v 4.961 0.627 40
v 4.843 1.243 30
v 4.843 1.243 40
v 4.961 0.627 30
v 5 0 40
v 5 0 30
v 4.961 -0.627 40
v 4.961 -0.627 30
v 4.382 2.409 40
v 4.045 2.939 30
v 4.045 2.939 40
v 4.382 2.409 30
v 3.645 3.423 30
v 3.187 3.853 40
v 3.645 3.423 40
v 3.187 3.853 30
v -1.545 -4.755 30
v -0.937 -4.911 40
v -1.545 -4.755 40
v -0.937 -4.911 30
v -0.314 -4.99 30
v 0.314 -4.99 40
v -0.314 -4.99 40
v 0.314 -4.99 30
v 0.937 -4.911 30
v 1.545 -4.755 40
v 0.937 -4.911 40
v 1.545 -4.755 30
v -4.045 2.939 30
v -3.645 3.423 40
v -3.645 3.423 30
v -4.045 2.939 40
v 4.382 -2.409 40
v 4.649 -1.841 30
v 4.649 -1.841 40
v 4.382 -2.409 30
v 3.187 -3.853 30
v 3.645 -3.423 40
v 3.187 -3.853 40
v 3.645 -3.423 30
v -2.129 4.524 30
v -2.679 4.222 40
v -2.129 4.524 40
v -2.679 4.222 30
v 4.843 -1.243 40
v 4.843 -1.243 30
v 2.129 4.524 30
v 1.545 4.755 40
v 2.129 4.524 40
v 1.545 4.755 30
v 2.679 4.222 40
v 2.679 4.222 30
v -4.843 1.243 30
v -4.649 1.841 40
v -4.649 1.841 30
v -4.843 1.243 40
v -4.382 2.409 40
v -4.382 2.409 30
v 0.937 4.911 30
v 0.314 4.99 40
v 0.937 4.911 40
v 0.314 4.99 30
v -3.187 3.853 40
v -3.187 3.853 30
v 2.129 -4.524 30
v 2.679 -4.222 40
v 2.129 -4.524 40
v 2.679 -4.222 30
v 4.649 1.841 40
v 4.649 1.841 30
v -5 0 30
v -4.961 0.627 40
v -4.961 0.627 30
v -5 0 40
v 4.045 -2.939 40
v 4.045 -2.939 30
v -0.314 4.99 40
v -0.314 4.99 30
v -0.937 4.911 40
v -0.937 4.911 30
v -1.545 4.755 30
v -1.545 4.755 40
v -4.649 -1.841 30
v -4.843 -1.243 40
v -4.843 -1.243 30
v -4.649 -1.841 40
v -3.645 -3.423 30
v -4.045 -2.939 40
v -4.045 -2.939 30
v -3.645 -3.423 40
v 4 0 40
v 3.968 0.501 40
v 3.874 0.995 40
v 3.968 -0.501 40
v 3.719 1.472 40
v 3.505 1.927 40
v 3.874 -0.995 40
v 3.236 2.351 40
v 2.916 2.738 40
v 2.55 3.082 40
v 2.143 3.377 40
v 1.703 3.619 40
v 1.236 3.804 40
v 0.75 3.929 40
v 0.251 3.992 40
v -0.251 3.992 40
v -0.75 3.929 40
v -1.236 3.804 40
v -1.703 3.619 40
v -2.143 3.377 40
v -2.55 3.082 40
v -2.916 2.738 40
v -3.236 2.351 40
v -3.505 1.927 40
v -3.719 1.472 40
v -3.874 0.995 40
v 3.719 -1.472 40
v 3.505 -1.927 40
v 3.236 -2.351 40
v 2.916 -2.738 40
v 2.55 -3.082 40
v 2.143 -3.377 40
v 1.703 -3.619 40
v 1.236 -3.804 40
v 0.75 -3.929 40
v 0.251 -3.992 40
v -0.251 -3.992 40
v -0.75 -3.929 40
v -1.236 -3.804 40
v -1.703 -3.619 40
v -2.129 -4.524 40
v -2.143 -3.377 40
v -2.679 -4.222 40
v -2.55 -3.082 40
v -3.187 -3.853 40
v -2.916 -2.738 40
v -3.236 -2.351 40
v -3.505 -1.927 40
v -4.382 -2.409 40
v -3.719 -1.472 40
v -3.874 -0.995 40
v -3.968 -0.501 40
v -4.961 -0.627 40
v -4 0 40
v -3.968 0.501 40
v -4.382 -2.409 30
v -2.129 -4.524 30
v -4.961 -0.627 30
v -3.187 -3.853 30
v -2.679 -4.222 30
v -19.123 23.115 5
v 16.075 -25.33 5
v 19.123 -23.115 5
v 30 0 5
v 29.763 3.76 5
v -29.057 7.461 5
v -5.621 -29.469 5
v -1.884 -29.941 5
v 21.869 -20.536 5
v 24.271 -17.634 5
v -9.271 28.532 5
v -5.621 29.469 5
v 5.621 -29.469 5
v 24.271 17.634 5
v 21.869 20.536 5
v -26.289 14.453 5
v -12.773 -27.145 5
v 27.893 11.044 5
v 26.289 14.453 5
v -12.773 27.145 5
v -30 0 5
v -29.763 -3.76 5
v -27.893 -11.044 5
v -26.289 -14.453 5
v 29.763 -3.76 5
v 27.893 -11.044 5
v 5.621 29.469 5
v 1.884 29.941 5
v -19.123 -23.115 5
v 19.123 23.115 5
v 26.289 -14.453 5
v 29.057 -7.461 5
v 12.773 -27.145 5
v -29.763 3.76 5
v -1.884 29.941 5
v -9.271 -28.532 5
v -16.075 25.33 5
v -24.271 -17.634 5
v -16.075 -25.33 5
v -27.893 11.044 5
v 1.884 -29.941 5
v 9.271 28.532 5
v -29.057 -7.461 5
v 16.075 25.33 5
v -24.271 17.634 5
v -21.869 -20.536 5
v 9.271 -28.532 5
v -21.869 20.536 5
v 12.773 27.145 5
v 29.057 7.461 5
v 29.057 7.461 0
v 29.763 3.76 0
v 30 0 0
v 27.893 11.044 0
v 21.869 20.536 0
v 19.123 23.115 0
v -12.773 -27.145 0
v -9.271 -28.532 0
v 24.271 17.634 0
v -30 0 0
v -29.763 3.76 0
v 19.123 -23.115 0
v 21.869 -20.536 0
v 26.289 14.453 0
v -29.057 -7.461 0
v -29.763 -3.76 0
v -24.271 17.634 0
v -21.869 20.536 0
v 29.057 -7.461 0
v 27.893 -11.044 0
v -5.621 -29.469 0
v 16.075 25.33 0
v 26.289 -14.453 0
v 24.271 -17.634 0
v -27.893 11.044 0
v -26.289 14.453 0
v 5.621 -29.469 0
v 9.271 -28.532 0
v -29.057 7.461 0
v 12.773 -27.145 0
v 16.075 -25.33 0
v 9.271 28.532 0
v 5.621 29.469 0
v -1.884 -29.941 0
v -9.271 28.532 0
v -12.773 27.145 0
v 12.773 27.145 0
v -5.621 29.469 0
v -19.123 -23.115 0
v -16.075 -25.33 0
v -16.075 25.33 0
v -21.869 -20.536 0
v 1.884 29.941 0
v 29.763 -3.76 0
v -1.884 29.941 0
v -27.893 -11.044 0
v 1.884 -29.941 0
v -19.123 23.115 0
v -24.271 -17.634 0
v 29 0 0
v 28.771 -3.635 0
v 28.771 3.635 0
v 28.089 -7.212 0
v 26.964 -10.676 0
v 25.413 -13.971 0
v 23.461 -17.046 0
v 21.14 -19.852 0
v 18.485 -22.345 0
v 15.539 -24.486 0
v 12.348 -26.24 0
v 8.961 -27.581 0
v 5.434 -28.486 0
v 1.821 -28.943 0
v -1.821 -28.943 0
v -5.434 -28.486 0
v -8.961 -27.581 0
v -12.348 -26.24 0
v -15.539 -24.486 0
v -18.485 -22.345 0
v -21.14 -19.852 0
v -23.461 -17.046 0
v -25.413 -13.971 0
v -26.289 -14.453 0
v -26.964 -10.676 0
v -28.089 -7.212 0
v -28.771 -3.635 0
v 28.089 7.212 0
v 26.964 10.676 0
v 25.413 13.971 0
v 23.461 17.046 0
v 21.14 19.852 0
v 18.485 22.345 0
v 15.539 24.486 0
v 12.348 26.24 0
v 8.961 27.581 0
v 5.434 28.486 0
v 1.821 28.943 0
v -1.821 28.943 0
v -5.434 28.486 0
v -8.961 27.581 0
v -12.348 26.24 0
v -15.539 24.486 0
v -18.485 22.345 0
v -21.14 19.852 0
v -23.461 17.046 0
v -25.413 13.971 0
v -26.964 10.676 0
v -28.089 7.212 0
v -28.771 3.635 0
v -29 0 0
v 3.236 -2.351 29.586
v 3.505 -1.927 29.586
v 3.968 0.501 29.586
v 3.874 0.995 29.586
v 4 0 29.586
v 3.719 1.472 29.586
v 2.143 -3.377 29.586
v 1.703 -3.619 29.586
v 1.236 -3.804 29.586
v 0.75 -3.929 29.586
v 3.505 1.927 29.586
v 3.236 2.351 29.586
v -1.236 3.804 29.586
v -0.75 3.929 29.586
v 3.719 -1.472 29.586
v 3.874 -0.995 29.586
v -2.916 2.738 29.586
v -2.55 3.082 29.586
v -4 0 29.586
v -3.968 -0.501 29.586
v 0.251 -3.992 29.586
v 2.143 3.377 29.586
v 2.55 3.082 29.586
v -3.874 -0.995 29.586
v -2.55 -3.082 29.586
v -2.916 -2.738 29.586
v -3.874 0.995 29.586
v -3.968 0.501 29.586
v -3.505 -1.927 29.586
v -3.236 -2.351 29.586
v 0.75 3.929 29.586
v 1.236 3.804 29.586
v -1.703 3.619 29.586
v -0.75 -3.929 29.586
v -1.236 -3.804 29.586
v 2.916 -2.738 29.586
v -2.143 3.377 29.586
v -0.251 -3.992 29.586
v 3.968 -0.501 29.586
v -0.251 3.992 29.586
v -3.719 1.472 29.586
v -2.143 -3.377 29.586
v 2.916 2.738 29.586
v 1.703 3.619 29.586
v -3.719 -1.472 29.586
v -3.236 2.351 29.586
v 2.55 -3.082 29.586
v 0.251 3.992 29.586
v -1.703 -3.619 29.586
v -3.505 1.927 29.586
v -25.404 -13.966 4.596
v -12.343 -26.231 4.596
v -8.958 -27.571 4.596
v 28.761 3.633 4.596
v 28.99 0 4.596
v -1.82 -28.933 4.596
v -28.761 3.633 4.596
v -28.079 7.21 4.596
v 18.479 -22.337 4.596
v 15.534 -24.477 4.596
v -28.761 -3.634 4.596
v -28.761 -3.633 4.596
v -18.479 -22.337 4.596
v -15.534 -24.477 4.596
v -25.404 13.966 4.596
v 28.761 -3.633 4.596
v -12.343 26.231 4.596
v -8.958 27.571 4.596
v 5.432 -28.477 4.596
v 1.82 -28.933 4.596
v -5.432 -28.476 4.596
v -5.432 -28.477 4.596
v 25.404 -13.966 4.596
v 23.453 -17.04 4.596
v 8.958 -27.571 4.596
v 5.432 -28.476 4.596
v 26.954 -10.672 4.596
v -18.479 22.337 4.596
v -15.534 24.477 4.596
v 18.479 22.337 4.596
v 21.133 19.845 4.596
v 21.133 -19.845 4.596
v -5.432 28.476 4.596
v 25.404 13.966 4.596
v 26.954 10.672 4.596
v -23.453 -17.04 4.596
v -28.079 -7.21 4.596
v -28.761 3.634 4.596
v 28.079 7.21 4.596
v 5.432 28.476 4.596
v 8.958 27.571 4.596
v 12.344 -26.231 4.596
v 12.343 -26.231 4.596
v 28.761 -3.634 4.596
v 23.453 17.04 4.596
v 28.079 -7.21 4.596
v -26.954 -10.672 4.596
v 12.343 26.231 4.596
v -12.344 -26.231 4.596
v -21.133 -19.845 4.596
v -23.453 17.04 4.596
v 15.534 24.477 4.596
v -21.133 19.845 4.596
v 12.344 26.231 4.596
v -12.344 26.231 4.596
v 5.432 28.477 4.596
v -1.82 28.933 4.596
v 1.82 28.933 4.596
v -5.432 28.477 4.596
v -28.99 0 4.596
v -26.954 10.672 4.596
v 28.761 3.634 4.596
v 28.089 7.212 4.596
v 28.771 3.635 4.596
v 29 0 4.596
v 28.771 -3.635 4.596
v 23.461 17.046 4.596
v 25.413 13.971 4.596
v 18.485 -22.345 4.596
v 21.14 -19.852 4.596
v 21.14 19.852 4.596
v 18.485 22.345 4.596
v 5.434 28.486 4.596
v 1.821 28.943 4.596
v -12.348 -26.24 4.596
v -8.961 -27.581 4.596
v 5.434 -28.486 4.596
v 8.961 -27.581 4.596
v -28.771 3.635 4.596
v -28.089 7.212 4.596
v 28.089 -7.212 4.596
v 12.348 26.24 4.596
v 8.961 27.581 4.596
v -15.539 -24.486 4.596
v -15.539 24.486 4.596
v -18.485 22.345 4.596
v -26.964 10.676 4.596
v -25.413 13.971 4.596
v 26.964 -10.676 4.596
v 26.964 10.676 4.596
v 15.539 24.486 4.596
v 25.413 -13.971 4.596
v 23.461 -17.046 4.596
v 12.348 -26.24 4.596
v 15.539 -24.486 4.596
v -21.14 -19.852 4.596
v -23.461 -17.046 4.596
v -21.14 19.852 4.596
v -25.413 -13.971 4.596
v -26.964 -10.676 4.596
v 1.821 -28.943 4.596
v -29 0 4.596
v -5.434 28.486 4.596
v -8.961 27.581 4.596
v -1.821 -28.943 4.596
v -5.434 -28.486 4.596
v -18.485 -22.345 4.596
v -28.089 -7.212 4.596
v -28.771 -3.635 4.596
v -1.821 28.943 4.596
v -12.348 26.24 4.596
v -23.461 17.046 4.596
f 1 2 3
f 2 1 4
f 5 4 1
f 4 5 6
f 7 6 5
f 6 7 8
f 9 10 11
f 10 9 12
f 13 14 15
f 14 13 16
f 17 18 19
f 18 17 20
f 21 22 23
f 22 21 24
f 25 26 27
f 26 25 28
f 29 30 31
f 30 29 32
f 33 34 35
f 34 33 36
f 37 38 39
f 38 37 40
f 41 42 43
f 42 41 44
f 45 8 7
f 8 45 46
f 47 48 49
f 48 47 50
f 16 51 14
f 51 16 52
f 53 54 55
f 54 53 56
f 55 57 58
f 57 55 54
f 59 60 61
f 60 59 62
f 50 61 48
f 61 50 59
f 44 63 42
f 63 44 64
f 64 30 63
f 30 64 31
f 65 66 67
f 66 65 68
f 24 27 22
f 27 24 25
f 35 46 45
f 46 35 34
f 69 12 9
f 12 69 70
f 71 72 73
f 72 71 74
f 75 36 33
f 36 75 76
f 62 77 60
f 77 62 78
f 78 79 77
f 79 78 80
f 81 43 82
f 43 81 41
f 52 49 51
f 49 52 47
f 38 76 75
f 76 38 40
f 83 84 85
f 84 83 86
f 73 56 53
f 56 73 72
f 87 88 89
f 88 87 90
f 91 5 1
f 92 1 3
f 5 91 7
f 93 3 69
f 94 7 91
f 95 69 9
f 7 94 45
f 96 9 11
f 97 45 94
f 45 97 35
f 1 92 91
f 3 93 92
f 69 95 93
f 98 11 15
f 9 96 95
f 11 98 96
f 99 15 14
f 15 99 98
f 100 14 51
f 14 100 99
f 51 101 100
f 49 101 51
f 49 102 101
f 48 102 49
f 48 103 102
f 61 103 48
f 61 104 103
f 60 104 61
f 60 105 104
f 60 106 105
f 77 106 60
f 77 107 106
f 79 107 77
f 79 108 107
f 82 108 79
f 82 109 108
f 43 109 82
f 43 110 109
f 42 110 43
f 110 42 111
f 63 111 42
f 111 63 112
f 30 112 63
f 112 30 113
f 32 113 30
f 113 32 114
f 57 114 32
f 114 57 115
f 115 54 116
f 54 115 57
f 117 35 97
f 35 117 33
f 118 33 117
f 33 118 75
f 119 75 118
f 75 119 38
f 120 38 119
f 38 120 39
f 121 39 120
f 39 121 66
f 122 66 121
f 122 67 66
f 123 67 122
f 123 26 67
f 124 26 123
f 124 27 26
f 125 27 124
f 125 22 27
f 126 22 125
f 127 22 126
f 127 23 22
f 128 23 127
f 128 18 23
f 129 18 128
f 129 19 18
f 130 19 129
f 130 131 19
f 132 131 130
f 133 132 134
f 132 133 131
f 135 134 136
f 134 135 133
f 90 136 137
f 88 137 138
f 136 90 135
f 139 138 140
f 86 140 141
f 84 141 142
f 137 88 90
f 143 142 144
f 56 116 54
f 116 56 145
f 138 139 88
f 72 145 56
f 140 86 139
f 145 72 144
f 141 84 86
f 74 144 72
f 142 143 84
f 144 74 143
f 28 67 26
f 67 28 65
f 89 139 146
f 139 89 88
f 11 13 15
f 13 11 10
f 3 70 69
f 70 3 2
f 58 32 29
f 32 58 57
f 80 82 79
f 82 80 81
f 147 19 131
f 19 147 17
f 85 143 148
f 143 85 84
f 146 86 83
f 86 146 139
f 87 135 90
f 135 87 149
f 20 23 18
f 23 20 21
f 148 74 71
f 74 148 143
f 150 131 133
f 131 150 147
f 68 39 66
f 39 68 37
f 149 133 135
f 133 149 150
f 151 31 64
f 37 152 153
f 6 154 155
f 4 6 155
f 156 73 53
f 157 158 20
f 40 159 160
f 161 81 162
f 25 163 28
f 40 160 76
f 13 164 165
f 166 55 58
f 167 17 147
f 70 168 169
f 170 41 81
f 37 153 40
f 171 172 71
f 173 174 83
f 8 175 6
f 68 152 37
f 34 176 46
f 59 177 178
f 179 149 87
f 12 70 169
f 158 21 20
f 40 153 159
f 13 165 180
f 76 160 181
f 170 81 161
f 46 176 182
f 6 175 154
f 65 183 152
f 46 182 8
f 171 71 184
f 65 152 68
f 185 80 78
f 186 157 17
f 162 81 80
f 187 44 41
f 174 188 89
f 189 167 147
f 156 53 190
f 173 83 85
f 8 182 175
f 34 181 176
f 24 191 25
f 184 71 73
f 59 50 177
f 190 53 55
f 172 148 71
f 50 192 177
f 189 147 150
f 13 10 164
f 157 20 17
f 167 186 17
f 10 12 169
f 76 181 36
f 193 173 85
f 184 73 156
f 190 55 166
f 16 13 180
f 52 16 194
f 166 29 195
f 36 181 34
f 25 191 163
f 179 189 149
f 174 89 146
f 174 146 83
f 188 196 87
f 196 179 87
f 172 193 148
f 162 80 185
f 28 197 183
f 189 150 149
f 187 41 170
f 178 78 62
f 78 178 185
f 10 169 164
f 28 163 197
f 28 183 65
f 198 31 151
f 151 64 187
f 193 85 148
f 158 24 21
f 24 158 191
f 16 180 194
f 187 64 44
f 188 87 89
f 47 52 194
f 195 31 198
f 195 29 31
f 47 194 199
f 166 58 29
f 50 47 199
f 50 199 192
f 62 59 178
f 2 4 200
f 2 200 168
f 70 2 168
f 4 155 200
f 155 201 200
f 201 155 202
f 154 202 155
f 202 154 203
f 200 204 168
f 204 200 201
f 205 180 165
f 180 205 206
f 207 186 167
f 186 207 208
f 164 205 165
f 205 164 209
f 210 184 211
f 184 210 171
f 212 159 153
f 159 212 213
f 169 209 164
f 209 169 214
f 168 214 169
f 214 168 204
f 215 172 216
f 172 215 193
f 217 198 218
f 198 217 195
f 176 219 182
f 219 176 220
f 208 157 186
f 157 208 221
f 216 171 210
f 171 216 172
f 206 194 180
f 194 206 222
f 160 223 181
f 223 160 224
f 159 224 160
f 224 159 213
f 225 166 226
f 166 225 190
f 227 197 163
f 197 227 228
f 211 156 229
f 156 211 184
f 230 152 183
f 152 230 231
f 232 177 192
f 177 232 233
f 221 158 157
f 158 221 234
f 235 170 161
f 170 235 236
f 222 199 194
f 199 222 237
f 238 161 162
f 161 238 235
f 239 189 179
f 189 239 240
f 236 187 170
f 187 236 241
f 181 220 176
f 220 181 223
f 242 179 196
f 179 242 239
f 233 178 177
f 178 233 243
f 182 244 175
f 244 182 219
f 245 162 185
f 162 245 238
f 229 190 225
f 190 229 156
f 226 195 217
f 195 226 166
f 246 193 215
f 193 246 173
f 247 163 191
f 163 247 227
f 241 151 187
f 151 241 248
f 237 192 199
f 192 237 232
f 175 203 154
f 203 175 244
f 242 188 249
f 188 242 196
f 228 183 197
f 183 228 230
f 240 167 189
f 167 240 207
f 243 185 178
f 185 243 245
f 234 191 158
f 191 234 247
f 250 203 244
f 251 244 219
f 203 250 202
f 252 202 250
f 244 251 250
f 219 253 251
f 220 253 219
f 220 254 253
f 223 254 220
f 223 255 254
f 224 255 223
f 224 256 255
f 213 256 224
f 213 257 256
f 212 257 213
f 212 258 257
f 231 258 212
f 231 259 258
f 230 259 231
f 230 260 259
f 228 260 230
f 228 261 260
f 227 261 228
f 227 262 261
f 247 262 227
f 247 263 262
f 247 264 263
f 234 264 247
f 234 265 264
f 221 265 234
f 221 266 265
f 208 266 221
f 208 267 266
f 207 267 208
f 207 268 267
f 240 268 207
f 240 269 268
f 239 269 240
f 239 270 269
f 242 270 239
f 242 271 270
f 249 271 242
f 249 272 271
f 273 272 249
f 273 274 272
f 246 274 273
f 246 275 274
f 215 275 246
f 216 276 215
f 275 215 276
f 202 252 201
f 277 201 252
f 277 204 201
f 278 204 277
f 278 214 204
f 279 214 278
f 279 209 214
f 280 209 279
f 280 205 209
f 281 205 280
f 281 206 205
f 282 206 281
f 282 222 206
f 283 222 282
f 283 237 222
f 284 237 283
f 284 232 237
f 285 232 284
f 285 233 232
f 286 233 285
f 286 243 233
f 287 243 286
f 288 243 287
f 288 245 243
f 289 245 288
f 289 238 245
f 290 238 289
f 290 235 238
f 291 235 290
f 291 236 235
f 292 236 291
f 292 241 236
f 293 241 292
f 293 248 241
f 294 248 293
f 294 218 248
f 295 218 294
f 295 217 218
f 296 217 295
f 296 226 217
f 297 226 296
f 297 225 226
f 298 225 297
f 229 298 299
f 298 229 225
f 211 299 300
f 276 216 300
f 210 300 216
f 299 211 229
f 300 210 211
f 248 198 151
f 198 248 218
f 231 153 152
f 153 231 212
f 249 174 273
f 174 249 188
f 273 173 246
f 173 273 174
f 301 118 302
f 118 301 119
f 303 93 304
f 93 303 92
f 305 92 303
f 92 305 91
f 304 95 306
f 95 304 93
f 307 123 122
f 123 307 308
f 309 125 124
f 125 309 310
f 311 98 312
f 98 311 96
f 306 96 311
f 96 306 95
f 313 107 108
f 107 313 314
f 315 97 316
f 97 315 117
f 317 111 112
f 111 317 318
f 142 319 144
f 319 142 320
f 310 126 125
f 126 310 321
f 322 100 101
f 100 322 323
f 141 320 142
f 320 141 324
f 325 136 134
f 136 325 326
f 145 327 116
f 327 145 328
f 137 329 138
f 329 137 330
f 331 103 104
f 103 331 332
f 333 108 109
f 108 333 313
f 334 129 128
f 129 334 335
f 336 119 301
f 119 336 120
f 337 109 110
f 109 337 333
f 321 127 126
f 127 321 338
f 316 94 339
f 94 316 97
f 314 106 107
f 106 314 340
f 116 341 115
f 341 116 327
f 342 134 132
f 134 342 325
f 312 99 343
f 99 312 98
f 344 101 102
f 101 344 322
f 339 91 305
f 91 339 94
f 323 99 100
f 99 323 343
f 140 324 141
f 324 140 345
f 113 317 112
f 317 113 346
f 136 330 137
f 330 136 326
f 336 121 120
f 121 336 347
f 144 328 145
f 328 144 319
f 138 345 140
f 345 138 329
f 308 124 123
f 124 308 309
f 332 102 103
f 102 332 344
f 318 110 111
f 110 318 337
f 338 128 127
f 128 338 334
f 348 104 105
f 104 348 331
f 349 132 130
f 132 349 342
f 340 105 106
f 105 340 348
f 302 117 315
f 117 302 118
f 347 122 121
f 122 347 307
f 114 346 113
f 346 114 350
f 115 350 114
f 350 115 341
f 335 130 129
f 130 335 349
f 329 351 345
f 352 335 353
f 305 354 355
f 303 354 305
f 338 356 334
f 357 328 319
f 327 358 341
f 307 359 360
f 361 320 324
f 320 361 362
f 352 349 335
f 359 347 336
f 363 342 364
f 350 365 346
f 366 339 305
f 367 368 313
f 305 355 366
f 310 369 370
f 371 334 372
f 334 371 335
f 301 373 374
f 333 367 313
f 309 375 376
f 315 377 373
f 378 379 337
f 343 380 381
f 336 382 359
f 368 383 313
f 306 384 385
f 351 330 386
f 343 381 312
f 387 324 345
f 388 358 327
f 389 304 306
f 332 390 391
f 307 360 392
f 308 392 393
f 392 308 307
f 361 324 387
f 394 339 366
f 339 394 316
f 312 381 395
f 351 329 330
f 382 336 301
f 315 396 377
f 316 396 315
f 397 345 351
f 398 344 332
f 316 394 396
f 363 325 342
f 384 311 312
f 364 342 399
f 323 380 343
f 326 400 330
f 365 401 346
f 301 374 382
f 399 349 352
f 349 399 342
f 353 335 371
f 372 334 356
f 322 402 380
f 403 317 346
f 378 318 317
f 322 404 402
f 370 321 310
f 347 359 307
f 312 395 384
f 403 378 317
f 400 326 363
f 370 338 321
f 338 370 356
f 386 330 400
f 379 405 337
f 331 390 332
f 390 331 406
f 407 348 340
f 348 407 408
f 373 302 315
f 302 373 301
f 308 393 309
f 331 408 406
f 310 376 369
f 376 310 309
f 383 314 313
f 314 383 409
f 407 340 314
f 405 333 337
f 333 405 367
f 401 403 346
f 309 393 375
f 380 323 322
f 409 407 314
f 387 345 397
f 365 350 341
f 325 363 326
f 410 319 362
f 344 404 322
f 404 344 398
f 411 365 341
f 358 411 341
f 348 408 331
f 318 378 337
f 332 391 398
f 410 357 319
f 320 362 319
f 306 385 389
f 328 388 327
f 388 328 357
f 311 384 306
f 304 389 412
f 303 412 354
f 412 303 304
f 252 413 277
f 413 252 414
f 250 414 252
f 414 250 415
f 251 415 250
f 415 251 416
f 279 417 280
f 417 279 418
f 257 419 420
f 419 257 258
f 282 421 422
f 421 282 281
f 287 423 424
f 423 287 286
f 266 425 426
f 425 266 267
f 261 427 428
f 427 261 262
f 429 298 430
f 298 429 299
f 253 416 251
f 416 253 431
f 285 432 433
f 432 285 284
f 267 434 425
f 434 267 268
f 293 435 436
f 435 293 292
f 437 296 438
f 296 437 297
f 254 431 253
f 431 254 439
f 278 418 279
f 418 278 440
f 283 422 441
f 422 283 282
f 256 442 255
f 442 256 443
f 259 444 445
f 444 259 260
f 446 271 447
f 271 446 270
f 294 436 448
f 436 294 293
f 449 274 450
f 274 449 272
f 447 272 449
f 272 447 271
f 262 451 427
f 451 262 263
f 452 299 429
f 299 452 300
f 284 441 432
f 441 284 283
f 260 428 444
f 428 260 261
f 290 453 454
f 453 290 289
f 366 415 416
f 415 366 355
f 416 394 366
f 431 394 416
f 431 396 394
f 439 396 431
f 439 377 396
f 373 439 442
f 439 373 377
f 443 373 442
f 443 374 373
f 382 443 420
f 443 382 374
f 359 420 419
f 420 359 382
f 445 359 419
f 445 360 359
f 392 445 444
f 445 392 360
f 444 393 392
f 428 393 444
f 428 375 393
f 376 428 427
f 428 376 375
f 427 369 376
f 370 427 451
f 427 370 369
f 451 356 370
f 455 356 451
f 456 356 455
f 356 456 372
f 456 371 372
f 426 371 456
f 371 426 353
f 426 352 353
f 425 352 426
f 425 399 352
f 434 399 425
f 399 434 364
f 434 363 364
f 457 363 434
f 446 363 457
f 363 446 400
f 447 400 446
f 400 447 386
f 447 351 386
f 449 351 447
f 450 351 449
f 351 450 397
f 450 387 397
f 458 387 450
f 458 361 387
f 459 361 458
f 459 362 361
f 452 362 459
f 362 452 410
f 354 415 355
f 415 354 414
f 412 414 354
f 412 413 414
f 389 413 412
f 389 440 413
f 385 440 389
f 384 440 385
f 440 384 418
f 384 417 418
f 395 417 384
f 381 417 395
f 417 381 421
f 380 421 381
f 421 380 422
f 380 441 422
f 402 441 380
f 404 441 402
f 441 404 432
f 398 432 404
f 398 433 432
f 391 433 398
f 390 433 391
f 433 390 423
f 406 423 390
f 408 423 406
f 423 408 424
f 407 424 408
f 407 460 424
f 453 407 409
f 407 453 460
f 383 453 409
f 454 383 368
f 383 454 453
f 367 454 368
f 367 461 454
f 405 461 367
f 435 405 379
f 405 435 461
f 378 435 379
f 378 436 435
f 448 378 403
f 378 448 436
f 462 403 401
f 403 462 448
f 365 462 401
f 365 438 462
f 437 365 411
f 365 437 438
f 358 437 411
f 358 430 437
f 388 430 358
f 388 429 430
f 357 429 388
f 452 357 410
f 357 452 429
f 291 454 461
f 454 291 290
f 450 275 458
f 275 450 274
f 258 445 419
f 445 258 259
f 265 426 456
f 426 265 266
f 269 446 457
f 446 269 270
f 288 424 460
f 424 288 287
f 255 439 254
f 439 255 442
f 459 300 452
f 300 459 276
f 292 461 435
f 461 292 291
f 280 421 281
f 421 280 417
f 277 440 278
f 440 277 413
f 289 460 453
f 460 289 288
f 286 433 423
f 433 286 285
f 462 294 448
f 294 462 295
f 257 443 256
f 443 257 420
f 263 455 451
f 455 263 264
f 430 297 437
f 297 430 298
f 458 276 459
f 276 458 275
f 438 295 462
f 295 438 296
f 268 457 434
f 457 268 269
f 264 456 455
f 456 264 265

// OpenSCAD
// preview[view:south, tilt:top diagonal]

//*********Declaration of customization variables************

//What outer diameter should the large opening have?
Large_End_Diameter = 60;

//What outer diameter should the small opening have?
Small_End_Diameter = 10;

//How thick should the walls be?
Wall_Thickness = 1; // [1:5]

//What's the overall height of the funnel?
Funnel_Height = 40;

//How tall should the band on the top be before the funnel begins?
Top_Band = 5;

//How long should the spout on the bottom be after the funnel ends?
Bottom_Spout_Length = 10;

//**********Assignment of customization vars to original scad vars***

spout_or = Small_End_Diameter/2;  //outer radius of bottom opening / spout
wall = Wall_Thickness; //wall thickness
flare_percentage = Large_End_Diameter / Small_End_Diameter * 100; // ratio of funnel opening (top) to spout (bottom), expressed as percentage
height = Funnel_Height; //total height
bottom_band=Bottom_Spout_Length;

res = 100/2; //resolution for cylinders
plane = 0.01/1;

//**********calculated variables*******************

spout_ir = spout_or - wall;
top_or = spout_or*flare_percentage/100;
top_ir = top_or - wall;

h1 = bottom_band;
h2 = height - Top_Band;
funnel_rise = height - bottom_band - Top_Band;
hi_adjust_ang = atan((top_or-spout_or)/funnel_rise)/2;
hi_adjust = wall*tan(hi_adjust_ang);

//**********begin build****************************

translate([0,0,height])mirror([0,0,1])difference(){

//**********outer shape****************************

union(){

cylinder(h=bottom_band,r=spout_or,$fn=res);
translate([0,0,h1])cylinder(h=funnel_rise,r1=spout_or,r2=top_or,$fn=res);
translate([0,0,h2])cylinder(h=Top_Band,r=top_or,$fn=res);

}

//**********inner shape****************************

union(){

cylinder(h=bottom_band+plane+hi_adjust,r=spout_ir,$fn=res);
translate([0,0,h1+hi_adjust])cylinder(h=funnel_rise,r1=spout_ir,r2=top_ir,$fn=res);
translate([0,0,h2+hi_adjust-plane])cylinder(h=Top_Band+hi_adjust+plane,r=top_ir,$fn=res);

//cube([top_or+1,top_or+1,height+1]); //cut for inspection of inner geometry

}

}
